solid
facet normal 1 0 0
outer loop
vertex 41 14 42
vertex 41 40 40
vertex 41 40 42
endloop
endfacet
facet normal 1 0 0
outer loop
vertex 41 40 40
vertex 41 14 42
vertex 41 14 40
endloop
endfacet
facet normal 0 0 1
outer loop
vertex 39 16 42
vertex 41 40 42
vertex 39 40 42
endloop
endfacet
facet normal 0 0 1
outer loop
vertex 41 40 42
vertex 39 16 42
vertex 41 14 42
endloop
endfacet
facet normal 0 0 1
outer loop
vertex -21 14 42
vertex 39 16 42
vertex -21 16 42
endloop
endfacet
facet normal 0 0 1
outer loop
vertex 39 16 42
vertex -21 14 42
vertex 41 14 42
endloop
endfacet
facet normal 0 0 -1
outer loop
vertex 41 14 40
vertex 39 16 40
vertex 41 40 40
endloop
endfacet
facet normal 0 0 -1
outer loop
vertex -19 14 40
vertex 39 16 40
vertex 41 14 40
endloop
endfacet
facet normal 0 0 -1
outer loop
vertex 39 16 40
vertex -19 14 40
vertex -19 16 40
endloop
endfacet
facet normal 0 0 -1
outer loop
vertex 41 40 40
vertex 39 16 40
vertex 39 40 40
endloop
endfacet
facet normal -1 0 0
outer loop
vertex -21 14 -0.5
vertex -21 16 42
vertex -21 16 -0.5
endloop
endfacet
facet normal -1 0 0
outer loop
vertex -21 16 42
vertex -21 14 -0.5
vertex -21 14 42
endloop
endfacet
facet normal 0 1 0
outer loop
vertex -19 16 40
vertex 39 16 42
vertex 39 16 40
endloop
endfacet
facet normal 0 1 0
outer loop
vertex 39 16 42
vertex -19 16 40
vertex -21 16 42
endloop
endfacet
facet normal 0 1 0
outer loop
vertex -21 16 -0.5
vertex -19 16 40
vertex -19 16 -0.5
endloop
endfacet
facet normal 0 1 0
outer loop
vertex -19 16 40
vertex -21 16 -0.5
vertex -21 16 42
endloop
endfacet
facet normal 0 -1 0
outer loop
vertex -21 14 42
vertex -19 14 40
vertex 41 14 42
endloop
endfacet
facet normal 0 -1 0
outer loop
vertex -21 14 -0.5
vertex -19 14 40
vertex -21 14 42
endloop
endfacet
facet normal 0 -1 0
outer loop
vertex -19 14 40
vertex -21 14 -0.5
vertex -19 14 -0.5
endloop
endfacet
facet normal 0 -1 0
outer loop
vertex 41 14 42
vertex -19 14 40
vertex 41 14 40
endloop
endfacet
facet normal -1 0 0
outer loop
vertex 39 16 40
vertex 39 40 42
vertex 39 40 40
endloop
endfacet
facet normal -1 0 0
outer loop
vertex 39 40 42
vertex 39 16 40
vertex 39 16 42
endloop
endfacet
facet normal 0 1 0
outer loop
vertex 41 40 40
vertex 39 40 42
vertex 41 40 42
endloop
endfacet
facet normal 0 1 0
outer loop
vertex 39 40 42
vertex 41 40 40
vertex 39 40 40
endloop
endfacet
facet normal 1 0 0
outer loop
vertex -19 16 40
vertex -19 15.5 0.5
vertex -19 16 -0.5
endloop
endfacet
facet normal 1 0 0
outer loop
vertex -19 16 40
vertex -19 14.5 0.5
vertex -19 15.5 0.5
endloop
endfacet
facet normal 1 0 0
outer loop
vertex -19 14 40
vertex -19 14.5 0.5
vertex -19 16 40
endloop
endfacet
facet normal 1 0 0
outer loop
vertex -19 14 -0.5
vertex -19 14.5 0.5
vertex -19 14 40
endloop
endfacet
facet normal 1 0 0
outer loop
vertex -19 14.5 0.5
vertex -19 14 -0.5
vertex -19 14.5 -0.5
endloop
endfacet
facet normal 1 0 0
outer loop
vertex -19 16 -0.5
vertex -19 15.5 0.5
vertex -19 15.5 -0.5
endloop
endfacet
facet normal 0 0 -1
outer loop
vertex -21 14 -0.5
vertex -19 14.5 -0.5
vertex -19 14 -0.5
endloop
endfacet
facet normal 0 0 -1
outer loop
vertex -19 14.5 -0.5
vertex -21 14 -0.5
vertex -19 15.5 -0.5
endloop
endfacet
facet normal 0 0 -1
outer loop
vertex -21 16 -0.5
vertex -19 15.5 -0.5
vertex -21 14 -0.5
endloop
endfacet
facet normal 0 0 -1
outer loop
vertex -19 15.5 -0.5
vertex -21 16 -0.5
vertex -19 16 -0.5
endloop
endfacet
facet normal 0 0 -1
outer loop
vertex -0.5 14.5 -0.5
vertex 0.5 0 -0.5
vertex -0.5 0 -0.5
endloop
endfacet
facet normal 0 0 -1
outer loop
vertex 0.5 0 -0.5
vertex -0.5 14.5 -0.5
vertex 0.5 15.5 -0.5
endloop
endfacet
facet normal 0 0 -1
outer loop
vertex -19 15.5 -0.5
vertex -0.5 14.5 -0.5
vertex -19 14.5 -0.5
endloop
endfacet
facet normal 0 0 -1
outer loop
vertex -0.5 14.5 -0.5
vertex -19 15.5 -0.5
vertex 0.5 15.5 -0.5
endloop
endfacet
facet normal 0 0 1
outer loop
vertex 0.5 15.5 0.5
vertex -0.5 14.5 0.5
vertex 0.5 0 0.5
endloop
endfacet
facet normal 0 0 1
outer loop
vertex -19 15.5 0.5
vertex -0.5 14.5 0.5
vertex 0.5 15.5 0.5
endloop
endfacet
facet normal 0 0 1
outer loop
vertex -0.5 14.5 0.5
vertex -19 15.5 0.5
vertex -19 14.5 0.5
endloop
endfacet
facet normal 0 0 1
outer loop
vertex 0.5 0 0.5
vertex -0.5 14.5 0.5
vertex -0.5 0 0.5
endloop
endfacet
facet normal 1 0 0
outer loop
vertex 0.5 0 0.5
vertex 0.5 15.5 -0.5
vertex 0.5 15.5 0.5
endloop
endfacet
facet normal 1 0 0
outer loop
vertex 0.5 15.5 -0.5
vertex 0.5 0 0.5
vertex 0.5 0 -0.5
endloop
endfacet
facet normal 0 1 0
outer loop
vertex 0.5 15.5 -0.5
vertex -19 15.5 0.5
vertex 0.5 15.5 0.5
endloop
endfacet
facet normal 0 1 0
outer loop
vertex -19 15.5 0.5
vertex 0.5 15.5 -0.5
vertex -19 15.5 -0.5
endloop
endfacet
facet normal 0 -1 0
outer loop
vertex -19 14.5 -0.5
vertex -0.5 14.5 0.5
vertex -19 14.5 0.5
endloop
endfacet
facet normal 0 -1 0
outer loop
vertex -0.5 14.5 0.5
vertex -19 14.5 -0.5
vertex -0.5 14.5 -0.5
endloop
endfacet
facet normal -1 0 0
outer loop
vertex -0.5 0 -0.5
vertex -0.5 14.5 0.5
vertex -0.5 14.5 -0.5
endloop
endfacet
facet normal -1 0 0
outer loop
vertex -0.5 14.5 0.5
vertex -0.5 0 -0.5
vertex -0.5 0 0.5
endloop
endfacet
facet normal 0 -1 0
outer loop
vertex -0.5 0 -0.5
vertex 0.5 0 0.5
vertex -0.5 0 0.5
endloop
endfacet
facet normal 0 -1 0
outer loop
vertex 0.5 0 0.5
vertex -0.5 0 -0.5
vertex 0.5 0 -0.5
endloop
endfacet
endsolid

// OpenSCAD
use <routing_181220.scad>;
//This openScad sketch will teach you how to use the routing_181220.scad routing function. The main purpose of this routing function is to rout a channel from one point to another in your openscad sketch and allow you to define exactly how that channel will be oriented between those two point. To start, lets define two points in space:

point_1 = [0, 0, 0]; //this point is centered at the origin
point_2 = [40, 40, 40]; //point_2 is 2 units away from point_1 in the x direction, 4 units away in the y direction, and 6 units away in the z direction.

//After defining the points we want to connect, lets define a matrix that will tell the routing function the width and height of the connections between the points. We can start by defining the height and width as variables:

//smaller width and height
w_chan = 1;
h_chan = 1;

//larger width and height
W_chan = 2;
H_chan = 2;

//In order to create the matrix, we must make a separate line of code for each size and direction of channel we want. Because we want two sizes of channels in the x, y, and z directions, we will need to write six lines of code. This is shown below. Notice that for the line defining the dimensions in the x-direction a vector of [0, 0] is in the x position. This is basically a placeholder because the size of the channel in the x direction will depend on the distance between the two points in the x direction. This is the same for all dimensions and is how the routing function knows to route the channel in that direction. In addition, for a routed channel of width w_chan, notice how this width is defined as [-w_chan/2, w_chan/2]. This signifies that the width of the channel will be centered upon the defined point.

//In some cases, you may not want a channel that is centered on the point. For example, in the z-direction of larger channels defined below (index numbers 3 & 4), the heigth is defined as [0, H_chan]. This means that instead of being centered on the defined point, the height of the channel will start from the z position of the point and extend upward by the amount H_chan.

dimensions_matrix =
[

    //defining x, y, and z smaller channels
    [[0, 0], [-w_chan/2, w_chan/2], [-h_chan/2, h_chan/2]], // index number 0, x-direction
    [[-w_chan/2, w_chan/2], [0, 0], [-h_chan/2, h_chan/2]], // index number 1, y-direction
    [[-w_chan/2, w_chan/2], [-w_chan/2, w_chan/2], [0, 0]], // index number 2, z-direction
    
    //defining x, y, and z larger channels
    [[0, 0], [-W_chan/2, W_chan/2], [0, H_chan]],           // index number 3, x-direction
    [[-W_chan/2, W_chan/2], [0, 0], [0, H_chan]],           // index number 4, y-direction
    [[-W_chan/2, W_chan/2], [-W_chan/2, W_chan/2], [0, 0]], // index number 5, z-direction
    
];

//After defining the sizes of our channels, next we will create a matrix that will define the connections between our two points. Each vector in this matrix contains a string, routing information and finally the index numbers of the desired channel sizes from the dimensions matrix we just made. In the first vector in the connection matrix, the first input is the string "+yzx". In this case, the + sign indicates that we will define how far to route in each direction, instead of routing directly to point_2. The order y, z, x means that we want to route first in the y direction, then the z direction and lastly in the x direction. The next input to the vector is [15, 8, -20]. These are the distances we want to route in the y, z, and x directions respectively. Finally, the vector [1, 2, 0] calls upon index numbers of the desired channel sizes from our dimensions_matrix. It is VERY important that the index numbers correspond to the correct routing direction as shown here.

//The next line of the connect_matrix starts with just the string "zxy", meaning that we will route directly to point_2 in the z direction first, then x and finally y. We then input our previously defined point_2 and the corresponding indeces from the dimensions_matrix. In this case we chose to use larger channels.

connect_matrix =
[

    ["+yx", [15, -20], [1, 0]], //move in the y direction 15 units, then -20 units in the x direction
    ["zxy", point_2, [5, 3, 4]], //connect from where we last were to point_2 by going in the z direction, then x direction then y direction.
    
];

//Now that all the setup is complete, we only need to call upon the actual routing function and input our initial point (point_1), the connect_matrix, and the dimensions matrix.

routing(point_1, connect_matrix, dimensions_matrix);

//The reason this routing function is so useful is that we only have to define the starting point and the final point and not all of the intermediate points in between. In addition, we can vary the size of the channel throughout the connection by defining different sizes in the dimension matrix.
